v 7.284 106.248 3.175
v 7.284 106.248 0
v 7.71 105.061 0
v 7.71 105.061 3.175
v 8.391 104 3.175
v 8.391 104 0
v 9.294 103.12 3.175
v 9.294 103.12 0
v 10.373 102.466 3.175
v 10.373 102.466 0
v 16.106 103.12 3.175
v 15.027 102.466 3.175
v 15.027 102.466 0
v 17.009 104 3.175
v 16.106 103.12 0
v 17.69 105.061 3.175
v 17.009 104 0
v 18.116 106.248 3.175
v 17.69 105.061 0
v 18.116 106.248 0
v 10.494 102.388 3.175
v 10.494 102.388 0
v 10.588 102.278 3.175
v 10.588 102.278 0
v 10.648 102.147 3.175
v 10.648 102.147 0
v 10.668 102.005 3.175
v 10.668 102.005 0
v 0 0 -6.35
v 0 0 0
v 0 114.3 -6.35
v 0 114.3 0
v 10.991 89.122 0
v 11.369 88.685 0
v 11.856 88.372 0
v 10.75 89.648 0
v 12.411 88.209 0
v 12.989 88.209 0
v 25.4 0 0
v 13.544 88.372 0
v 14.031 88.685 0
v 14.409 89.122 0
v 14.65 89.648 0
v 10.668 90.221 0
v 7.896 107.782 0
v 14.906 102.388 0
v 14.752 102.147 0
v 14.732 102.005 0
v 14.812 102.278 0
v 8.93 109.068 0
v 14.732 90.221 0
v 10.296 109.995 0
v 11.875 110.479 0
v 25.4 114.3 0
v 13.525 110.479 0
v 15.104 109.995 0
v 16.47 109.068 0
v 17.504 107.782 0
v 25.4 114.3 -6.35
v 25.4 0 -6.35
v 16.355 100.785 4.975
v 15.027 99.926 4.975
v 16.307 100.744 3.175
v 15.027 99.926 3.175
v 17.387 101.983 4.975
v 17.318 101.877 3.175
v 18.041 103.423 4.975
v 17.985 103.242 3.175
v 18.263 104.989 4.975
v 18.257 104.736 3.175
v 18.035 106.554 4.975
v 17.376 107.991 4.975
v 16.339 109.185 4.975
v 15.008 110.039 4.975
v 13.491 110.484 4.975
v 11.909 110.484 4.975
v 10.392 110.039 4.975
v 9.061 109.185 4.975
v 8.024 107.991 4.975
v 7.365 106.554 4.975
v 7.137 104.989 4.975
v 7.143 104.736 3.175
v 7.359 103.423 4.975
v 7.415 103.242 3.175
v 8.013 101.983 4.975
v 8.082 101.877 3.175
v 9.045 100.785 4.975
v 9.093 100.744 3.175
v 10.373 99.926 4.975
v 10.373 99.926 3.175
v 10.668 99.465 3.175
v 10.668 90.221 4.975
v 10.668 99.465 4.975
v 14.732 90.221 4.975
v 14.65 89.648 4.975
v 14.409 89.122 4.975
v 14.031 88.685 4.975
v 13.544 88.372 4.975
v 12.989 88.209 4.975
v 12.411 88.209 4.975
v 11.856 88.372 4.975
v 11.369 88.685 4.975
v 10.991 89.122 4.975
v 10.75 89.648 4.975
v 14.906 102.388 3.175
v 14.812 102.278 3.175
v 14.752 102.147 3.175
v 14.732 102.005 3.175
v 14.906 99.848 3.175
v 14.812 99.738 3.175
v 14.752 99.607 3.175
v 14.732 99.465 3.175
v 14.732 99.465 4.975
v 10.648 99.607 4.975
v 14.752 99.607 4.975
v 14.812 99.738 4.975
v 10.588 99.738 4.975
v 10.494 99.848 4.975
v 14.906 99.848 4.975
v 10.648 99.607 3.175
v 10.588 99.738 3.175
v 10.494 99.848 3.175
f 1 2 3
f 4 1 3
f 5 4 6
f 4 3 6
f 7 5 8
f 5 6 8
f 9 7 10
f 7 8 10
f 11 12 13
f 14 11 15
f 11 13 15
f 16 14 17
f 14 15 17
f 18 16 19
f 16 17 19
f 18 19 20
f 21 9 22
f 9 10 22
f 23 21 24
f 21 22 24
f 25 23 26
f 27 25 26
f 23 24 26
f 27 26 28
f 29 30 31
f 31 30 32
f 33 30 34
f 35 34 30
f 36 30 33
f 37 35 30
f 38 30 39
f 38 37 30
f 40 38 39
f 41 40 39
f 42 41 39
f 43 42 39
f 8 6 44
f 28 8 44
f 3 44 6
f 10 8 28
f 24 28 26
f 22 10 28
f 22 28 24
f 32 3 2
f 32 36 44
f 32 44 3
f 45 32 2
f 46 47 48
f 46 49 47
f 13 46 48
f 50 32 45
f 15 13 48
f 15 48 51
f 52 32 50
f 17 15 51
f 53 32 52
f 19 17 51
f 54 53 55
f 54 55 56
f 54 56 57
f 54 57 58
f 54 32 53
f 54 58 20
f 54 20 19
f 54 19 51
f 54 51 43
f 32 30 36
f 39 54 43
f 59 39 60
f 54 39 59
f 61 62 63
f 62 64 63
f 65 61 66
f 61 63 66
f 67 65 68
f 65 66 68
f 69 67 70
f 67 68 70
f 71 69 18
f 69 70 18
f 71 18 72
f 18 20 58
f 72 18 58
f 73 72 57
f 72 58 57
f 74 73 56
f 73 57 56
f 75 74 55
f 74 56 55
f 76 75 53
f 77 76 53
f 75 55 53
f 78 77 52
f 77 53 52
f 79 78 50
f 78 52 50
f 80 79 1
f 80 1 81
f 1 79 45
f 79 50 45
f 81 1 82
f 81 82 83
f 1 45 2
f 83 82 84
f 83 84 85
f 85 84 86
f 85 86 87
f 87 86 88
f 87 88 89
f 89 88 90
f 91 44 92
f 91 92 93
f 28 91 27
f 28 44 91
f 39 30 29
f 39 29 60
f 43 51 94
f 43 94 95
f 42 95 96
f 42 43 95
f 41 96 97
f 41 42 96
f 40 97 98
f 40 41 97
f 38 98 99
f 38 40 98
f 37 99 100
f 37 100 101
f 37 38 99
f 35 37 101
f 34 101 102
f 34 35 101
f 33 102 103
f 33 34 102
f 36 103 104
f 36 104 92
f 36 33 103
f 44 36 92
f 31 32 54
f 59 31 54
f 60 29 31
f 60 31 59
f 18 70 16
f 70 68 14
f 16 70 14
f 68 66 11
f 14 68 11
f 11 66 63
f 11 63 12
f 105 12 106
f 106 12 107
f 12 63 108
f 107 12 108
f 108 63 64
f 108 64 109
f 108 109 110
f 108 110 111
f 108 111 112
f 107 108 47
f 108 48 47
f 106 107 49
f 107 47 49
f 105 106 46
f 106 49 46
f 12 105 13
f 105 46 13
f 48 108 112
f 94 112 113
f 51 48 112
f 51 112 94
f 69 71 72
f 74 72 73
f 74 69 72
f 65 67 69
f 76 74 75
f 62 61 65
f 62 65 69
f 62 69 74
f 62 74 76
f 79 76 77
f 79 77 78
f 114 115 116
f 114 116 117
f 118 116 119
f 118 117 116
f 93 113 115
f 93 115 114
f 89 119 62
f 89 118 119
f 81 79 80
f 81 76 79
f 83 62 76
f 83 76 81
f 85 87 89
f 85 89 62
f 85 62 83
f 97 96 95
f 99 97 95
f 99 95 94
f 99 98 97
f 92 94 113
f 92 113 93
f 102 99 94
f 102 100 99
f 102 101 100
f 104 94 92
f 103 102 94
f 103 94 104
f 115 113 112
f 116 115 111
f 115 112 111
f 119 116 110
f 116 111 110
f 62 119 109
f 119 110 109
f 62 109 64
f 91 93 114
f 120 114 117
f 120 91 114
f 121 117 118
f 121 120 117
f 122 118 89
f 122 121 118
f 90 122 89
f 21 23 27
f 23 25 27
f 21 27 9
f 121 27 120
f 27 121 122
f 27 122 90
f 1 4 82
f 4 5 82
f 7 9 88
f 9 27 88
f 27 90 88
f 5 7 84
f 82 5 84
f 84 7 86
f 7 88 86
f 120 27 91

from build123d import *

# Parameters (mm, degrees)
SKETCH1_W           = 25.4
SKETCH1_H           = 114.3
BOSS_EXTRUDE1_DEPTH = 6.35
SKETCH2_R           = 5.5626
BOSS_EXTRUDE2_DEPTH = 3.175
SKETCH3_R           = 5.5626
BOSS_EXTRUDE3_DEPTH = 1.799999956
BOSS_EXTRUDE4_REACH = 119.26
CUT_EXTRUDE1_START  = -4.974999956
CUT_EXTRUDE1_DEPTH  = 4.974999956
FILLET1_R           = 0.508


with BuildPart() as part:
    # Sketch1 → Boss-Extrude1 (new body)
    with BuildSketch(Plane.XY):
        with Locations((12.7, 57.15)):
            Rectangle(SKETCH1_W, SKETCH1_H)
    extrude(amount=-BOSS_EXTRUDE1_DEPTH)

    # Sketch2 → Boss-Extrude2 (add)
    with BuildSketch(Plane.XY):
        with Locations(Location((12.7, 107.5182, 0), (0, 0, 180))):
            Circle(SKETCH2_R)
    extrude(amount=BOSS_EXTRUDE2_DEPTH)

    # Sketch3 → Boss-Extrude3 (add)
    with BuildSketch(Plane.XY.offset(3.175)):
        with Locations(Location((12.7, 104.9782, 0), (0, 0, 166.802375663))):
            Circle(SKETCH3_R)
    extrude(amount=BOSS_EXTRUDE3_DEPTH)

    # Boss-Extrude4: up to this face of the body (flat: up to its plane)
    boss_extrude4_end = Plane(part.part.faces().sort_by_distance((12.7, 104.9782, 4.974999956))[0])
    # Sketch4 → Boss-Extrude4 (add, up to the picked face)
    with BuildSketch(Plane.XY, mode=Mode.PRIVATE) as boss_extrude4_sk1:
        with BuildLine():
            Line((14.732, 107.5182), (14.732, 90.2208))
            ThreePointArc((14.732, 90.2208), (12.7, 88.1888), (10.668, 90.2208))
            Line((10.668, 90.2208), (10.668, 107.5182))
            ThreePointArc((10.668, 107.5182), (12.7, 109.5502), (14.732, 107.5182))
        make_face()
    boss_extrude4_tool1 = split(extrude(boss_extrude4_sk1.sketch, amount=BOSS_EXTRUDE4_REACH, mode=Mode.PRIVATE), bisect_by=boss_extrude4_end, keep=Keep.BOTH, mode=Mode.PRIVATE)
    add(boss_extrude4_tool1.solids().sort_by(Axis((12.7, 98.8695, 0), (0, 0, 1)))[0])

    # Sketch5 → Cut-Extrude1 (cut)
    with BuildSketch(Plane.XY.offset(4.974999956).offset(CUT_EXTRUDE1_START)):
        with BuildLine():
            Line((7.1374, 114.3), (7.1374, 104.9782))
            ThreePointArc((7.1374, 104.9782), (12.7, 110.5408), (18.2626, 104.9782))
            Line((18.2626, 104.9782), (18.2626, 114.3))
            Line((18.2626, 114.3), (7.1374, 114.3))
        make_face()
    extrude(amount=CUT_EXTRUDE1_DEPTH, mode=Mode.SUBTRACT)

    # Fillet1
    fillet1_edges = [part.edges().sort_by_distance(p)[0] for p in [
        (10.668, 102.340025152, 1.5875),
        (10.668, 99.800025152, 4.074999978),
        (14.732, 102.340025152, 1.5875),
        (14.732, 99.800025152, 4.074999978),
    ]]
    fillet(fillet1_edges, radius=FILLET1_R)


solid = part.part
